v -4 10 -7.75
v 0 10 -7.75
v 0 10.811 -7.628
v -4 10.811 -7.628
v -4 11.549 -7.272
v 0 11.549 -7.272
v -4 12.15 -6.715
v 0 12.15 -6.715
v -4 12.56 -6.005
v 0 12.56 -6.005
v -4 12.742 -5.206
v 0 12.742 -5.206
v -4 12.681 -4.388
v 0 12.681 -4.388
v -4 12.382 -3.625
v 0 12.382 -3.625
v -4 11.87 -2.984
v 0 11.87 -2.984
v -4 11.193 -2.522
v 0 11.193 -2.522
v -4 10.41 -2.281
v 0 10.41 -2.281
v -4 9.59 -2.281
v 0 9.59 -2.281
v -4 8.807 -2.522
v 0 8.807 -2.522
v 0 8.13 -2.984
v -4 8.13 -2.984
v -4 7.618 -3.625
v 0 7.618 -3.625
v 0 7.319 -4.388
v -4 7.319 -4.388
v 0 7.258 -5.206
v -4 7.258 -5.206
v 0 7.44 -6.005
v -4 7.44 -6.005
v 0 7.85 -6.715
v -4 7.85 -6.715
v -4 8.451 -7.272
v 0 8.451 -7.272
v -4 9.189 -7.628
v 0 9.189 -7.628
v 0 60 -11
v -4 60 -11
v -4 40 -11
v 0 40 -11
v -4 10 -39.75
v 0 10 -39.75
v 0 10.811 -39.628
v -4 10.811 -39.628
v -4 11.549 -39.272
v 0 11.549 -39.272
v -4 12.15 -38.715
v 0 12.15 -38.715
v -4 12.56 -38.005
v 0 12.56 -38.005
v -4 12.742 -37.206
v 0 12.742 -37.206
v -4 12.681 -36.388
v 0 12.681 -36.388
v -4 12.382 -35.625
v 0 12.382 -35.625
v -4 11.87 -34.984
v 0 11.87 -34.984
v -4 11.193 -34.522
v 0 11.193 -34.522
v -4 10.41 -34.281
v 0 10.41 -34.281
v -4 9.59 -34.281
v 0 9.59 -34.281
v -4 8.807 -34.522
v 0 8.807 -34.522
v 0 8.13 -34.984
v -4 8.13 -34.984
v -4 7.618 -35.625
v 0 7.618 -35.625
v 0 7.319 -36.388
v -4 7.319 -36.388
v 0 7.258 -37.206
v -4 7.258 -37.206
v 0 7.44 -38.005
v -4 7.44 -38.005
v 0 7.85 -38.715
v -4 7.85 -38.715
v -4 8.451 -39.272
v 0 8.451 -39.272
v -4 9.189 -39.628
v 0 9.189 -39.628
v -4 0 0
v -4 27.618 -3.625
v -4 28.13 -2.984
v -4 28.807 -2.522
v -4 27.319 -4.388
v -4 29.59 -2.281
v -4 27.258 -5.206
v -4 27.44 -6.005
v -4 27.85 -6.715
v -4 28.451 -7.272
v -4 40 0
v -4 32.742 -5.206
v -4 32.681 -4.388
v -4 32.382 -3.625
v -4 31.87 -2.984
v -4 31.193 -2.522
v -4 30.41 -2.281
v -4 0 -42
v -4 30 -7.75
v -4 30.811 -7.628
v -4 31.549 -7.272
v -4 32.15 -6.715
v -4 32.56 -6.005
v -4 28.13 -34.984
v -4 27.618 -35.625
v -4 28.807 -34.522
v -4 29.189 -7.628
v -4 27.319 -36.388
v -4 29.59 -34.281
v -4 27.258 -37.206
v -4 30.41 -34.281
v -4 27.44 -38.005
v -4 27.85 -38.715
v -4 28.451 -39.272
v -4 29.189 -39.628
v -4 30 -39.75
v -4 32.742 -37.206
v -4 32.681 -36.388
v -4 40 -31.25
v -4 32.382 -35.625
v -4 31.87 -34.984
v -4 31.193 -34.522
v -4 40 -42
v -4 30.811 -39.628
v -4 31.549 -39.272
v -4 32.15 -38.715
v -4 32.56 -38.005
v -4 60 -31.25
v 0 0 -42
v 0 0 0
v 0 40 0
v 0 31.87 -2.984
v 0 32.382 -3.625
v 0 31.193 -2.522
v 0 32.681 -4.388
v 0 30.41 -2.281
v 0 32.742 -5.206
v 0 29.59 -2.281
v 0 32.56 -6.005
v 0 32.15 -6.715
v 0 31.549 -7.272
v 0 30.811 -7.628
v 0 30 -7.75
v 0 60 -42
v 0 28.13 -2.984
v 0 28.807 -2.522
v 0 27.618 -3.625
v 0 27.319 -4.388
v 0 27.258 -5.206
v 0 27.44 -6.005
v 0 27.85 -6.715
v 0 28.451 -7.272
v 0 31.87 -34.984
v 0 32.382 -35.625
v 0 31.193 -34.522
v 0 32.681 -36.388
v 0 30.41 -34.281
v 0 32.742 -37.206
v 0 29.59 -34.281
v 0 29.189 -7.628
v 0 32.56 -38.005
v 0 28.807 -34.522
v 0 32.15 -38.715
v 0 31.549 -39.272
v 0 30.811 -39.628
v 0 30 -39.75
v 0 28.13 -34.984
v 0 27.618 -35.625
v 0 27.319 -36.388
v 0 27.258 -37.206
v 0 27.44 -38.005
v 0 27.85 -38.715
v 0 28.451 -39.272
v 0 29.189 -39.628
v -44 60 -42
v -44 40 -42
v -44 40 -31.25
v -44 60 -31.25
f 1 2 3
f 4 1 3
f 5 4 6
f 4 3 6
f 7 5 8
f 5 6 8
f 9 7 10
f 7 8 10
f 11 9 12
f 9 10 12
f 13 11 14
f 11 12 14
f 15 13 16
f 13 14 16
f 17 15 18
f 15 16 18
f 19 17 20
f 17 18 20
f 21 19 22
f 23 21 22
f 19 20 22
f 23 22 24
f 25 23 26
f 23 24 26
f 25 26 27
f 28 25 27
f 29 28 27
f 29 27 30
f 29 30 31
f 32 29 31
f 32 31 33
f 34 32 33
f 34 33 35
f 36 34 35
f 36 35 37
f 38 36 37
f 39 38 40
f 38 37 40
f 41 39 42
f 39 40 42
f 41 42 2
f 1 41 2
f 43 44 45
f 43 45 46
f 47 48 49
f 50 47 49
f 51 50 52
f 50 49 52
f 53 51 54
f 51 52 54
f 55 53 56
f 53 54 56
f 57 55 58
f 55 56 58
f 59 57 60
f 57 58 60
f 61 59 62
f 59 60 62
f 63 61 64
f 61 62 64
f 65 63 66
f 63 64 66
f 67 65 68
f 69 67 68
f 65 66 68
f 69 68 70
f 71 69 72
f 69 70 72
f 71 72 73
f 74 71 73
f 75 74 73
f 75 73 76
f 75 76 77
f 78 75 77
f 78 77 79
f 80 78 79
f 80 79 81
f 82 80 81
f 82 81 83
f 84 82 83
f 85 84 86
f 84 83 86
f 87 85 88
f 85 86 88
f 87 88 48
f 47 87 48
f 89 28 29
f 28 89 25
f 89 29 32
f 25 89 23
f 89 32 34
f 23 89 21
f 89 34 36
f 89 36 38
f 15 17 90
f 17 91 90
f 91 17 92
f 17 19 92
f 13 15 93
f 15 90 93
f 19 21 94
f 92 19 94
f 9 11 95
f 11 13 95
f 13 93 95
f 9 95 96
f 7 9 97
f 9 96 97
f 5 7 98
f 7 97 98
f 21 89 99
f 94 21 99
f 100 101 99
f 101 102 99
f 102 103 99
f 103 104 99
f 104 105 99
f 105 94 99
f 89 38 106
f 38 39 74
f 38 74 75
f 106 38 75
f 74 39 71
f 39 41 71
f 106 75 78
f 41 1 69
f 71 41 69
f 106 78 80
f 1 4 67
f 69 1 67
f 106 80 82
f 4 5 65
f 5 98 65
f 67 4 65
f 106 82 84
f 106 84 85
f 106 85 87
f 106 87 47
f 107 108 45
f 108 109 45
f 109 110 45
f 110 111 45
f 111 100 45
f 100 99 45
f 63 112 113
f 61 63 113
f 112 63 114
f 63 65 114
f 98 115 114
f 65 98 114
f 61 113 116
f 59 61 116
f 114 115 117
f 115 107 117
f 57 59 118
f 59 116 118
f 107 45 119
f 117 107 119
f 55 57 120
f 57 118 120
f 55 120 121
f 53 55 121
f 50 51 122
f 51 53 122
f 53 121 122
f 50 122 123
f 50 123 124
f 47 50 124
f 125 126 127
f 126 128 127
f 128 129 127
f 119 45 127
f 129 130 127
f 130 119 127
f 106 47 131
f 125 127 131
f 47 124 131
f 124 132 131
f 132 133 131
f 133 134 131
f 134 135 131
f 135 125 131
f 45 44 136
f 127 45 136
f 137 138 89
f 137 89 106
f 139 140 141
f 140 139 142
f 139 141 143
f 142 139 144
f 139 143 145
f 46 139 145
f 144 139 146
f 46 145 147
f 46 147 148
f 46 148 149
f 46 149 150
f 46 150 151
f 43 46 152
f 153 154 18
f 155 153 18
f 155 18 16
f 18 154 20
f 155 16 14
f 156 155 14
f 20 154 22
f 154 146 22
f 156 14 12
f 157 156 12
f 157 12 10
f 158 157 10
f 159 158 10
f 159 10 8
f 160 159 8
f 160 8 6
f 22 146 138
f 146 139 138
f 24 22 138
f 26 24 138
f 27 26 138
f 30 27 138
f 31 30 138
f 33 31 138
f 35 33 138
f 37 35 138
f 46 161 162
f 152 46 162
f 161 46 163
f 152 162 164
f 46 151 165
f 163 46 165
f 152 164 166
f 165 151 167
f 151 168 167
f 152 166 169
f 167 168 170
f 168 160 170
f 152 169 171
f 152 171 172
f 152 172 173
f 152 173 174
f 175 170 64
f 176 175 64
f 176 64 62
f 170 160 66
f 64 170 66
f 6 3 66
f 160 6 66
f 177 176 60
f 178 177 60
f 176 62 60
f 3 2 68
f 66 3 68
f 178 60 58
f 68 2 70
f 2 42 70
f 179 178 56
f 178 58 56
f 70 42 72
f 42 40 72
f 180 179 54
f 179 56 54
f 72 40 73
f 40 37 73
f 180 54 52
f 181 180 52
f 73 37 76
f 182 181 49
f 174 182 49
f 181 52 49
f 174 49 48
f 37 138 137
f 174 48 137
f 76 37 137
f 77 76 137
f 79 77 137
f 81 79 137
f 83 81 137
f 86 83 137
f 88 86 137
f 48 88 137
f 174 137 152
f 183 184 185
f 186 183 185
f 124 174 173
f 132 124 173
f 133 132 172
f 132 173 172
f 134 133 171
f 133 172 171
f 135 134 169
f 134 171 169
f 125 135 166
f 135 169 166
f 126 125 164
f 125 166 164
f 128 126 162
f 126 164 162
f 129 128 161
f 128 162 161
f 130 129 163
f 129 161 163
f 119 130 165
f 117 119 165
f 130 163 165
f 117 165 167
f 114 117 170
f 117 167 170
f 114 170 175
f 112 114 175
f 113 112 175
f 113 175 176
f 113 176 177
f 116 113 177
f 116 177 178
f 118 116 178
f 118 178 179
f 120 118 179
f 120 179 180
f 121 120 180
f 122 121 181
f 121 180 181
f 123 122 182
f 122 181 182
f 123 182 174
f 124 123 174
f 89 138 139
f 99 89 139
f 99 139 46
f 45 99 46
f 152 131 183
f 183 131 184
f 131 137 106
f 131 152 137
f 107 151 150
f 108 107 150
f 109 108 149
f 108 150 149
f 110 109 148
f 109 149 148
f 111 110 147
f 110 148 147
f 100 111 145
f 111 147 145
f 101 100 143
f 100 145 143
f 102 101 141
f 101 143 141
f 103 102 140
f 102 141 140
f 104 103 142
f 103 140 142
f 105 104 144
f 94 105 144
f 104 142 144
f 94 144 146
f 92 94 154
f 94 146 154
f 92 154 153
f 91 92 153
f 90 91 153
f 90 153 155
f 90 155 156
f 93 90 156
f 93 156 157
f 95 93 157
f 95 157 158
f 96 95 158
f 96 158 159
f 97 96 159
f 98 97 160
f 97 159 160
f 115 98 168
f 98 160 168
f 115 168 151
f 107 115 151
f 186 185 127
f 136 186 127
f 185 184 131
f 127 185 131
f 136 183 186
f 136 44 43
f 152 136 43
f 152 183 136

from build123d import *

# Parameters (mm, degrees)
SKETCH1_W           = 42
SKETCH1_H           = 40
SKETCH1_R           = 2.75
BOSS_EXTRUDE1_DEPTH = 4
BOSS_EXTRUDE2_DEPTH = 20


with BuildPart() as part:
    # Sketch1 → Boss-Extrude1 (new body)
    with BuildSketch(Plane(origin=(0, 0, 0), x_dir=(0, 0, -1), z_dir=(1, 0, 0))):
        with Locations((21, 20)):
            Rectangle(SKETCH1_W, SKETCH1_H)
        with Locations((5, 30)):
            Circle(SKETCH1_R, mode=Mode.SUBTRACT)
        with Locations((5, 10)):
            Circle(SKETCH1_R, mode=Mode.SUBTRACT)
        with Locations((37, 10)):
            Circle(SKETCH1_R, mode=Mode.SUBTRACT)
        with Locations((37, 30)):
            Circle(SKETCH1_R, mode=Mode.SUBTRACT)
    extrude(amount=-BOSS_EXTRUDE1_DEPTH)

    # Sketch3 → Boss-Extrude2 (add)
    with BuildSketch(Plane(origin=(0, 40, 0), x_dir=(1, 0, 0), z_dir=(0, 1, 0))):
        Polygon((0, 42), (-44, 42), (-44, 31.25), (-4, 31.25), (-4, 11), (0, 11), align=None)
    extrude(amount=BOSS_EXTRUDE2_DEPTH)


solid = part.part
